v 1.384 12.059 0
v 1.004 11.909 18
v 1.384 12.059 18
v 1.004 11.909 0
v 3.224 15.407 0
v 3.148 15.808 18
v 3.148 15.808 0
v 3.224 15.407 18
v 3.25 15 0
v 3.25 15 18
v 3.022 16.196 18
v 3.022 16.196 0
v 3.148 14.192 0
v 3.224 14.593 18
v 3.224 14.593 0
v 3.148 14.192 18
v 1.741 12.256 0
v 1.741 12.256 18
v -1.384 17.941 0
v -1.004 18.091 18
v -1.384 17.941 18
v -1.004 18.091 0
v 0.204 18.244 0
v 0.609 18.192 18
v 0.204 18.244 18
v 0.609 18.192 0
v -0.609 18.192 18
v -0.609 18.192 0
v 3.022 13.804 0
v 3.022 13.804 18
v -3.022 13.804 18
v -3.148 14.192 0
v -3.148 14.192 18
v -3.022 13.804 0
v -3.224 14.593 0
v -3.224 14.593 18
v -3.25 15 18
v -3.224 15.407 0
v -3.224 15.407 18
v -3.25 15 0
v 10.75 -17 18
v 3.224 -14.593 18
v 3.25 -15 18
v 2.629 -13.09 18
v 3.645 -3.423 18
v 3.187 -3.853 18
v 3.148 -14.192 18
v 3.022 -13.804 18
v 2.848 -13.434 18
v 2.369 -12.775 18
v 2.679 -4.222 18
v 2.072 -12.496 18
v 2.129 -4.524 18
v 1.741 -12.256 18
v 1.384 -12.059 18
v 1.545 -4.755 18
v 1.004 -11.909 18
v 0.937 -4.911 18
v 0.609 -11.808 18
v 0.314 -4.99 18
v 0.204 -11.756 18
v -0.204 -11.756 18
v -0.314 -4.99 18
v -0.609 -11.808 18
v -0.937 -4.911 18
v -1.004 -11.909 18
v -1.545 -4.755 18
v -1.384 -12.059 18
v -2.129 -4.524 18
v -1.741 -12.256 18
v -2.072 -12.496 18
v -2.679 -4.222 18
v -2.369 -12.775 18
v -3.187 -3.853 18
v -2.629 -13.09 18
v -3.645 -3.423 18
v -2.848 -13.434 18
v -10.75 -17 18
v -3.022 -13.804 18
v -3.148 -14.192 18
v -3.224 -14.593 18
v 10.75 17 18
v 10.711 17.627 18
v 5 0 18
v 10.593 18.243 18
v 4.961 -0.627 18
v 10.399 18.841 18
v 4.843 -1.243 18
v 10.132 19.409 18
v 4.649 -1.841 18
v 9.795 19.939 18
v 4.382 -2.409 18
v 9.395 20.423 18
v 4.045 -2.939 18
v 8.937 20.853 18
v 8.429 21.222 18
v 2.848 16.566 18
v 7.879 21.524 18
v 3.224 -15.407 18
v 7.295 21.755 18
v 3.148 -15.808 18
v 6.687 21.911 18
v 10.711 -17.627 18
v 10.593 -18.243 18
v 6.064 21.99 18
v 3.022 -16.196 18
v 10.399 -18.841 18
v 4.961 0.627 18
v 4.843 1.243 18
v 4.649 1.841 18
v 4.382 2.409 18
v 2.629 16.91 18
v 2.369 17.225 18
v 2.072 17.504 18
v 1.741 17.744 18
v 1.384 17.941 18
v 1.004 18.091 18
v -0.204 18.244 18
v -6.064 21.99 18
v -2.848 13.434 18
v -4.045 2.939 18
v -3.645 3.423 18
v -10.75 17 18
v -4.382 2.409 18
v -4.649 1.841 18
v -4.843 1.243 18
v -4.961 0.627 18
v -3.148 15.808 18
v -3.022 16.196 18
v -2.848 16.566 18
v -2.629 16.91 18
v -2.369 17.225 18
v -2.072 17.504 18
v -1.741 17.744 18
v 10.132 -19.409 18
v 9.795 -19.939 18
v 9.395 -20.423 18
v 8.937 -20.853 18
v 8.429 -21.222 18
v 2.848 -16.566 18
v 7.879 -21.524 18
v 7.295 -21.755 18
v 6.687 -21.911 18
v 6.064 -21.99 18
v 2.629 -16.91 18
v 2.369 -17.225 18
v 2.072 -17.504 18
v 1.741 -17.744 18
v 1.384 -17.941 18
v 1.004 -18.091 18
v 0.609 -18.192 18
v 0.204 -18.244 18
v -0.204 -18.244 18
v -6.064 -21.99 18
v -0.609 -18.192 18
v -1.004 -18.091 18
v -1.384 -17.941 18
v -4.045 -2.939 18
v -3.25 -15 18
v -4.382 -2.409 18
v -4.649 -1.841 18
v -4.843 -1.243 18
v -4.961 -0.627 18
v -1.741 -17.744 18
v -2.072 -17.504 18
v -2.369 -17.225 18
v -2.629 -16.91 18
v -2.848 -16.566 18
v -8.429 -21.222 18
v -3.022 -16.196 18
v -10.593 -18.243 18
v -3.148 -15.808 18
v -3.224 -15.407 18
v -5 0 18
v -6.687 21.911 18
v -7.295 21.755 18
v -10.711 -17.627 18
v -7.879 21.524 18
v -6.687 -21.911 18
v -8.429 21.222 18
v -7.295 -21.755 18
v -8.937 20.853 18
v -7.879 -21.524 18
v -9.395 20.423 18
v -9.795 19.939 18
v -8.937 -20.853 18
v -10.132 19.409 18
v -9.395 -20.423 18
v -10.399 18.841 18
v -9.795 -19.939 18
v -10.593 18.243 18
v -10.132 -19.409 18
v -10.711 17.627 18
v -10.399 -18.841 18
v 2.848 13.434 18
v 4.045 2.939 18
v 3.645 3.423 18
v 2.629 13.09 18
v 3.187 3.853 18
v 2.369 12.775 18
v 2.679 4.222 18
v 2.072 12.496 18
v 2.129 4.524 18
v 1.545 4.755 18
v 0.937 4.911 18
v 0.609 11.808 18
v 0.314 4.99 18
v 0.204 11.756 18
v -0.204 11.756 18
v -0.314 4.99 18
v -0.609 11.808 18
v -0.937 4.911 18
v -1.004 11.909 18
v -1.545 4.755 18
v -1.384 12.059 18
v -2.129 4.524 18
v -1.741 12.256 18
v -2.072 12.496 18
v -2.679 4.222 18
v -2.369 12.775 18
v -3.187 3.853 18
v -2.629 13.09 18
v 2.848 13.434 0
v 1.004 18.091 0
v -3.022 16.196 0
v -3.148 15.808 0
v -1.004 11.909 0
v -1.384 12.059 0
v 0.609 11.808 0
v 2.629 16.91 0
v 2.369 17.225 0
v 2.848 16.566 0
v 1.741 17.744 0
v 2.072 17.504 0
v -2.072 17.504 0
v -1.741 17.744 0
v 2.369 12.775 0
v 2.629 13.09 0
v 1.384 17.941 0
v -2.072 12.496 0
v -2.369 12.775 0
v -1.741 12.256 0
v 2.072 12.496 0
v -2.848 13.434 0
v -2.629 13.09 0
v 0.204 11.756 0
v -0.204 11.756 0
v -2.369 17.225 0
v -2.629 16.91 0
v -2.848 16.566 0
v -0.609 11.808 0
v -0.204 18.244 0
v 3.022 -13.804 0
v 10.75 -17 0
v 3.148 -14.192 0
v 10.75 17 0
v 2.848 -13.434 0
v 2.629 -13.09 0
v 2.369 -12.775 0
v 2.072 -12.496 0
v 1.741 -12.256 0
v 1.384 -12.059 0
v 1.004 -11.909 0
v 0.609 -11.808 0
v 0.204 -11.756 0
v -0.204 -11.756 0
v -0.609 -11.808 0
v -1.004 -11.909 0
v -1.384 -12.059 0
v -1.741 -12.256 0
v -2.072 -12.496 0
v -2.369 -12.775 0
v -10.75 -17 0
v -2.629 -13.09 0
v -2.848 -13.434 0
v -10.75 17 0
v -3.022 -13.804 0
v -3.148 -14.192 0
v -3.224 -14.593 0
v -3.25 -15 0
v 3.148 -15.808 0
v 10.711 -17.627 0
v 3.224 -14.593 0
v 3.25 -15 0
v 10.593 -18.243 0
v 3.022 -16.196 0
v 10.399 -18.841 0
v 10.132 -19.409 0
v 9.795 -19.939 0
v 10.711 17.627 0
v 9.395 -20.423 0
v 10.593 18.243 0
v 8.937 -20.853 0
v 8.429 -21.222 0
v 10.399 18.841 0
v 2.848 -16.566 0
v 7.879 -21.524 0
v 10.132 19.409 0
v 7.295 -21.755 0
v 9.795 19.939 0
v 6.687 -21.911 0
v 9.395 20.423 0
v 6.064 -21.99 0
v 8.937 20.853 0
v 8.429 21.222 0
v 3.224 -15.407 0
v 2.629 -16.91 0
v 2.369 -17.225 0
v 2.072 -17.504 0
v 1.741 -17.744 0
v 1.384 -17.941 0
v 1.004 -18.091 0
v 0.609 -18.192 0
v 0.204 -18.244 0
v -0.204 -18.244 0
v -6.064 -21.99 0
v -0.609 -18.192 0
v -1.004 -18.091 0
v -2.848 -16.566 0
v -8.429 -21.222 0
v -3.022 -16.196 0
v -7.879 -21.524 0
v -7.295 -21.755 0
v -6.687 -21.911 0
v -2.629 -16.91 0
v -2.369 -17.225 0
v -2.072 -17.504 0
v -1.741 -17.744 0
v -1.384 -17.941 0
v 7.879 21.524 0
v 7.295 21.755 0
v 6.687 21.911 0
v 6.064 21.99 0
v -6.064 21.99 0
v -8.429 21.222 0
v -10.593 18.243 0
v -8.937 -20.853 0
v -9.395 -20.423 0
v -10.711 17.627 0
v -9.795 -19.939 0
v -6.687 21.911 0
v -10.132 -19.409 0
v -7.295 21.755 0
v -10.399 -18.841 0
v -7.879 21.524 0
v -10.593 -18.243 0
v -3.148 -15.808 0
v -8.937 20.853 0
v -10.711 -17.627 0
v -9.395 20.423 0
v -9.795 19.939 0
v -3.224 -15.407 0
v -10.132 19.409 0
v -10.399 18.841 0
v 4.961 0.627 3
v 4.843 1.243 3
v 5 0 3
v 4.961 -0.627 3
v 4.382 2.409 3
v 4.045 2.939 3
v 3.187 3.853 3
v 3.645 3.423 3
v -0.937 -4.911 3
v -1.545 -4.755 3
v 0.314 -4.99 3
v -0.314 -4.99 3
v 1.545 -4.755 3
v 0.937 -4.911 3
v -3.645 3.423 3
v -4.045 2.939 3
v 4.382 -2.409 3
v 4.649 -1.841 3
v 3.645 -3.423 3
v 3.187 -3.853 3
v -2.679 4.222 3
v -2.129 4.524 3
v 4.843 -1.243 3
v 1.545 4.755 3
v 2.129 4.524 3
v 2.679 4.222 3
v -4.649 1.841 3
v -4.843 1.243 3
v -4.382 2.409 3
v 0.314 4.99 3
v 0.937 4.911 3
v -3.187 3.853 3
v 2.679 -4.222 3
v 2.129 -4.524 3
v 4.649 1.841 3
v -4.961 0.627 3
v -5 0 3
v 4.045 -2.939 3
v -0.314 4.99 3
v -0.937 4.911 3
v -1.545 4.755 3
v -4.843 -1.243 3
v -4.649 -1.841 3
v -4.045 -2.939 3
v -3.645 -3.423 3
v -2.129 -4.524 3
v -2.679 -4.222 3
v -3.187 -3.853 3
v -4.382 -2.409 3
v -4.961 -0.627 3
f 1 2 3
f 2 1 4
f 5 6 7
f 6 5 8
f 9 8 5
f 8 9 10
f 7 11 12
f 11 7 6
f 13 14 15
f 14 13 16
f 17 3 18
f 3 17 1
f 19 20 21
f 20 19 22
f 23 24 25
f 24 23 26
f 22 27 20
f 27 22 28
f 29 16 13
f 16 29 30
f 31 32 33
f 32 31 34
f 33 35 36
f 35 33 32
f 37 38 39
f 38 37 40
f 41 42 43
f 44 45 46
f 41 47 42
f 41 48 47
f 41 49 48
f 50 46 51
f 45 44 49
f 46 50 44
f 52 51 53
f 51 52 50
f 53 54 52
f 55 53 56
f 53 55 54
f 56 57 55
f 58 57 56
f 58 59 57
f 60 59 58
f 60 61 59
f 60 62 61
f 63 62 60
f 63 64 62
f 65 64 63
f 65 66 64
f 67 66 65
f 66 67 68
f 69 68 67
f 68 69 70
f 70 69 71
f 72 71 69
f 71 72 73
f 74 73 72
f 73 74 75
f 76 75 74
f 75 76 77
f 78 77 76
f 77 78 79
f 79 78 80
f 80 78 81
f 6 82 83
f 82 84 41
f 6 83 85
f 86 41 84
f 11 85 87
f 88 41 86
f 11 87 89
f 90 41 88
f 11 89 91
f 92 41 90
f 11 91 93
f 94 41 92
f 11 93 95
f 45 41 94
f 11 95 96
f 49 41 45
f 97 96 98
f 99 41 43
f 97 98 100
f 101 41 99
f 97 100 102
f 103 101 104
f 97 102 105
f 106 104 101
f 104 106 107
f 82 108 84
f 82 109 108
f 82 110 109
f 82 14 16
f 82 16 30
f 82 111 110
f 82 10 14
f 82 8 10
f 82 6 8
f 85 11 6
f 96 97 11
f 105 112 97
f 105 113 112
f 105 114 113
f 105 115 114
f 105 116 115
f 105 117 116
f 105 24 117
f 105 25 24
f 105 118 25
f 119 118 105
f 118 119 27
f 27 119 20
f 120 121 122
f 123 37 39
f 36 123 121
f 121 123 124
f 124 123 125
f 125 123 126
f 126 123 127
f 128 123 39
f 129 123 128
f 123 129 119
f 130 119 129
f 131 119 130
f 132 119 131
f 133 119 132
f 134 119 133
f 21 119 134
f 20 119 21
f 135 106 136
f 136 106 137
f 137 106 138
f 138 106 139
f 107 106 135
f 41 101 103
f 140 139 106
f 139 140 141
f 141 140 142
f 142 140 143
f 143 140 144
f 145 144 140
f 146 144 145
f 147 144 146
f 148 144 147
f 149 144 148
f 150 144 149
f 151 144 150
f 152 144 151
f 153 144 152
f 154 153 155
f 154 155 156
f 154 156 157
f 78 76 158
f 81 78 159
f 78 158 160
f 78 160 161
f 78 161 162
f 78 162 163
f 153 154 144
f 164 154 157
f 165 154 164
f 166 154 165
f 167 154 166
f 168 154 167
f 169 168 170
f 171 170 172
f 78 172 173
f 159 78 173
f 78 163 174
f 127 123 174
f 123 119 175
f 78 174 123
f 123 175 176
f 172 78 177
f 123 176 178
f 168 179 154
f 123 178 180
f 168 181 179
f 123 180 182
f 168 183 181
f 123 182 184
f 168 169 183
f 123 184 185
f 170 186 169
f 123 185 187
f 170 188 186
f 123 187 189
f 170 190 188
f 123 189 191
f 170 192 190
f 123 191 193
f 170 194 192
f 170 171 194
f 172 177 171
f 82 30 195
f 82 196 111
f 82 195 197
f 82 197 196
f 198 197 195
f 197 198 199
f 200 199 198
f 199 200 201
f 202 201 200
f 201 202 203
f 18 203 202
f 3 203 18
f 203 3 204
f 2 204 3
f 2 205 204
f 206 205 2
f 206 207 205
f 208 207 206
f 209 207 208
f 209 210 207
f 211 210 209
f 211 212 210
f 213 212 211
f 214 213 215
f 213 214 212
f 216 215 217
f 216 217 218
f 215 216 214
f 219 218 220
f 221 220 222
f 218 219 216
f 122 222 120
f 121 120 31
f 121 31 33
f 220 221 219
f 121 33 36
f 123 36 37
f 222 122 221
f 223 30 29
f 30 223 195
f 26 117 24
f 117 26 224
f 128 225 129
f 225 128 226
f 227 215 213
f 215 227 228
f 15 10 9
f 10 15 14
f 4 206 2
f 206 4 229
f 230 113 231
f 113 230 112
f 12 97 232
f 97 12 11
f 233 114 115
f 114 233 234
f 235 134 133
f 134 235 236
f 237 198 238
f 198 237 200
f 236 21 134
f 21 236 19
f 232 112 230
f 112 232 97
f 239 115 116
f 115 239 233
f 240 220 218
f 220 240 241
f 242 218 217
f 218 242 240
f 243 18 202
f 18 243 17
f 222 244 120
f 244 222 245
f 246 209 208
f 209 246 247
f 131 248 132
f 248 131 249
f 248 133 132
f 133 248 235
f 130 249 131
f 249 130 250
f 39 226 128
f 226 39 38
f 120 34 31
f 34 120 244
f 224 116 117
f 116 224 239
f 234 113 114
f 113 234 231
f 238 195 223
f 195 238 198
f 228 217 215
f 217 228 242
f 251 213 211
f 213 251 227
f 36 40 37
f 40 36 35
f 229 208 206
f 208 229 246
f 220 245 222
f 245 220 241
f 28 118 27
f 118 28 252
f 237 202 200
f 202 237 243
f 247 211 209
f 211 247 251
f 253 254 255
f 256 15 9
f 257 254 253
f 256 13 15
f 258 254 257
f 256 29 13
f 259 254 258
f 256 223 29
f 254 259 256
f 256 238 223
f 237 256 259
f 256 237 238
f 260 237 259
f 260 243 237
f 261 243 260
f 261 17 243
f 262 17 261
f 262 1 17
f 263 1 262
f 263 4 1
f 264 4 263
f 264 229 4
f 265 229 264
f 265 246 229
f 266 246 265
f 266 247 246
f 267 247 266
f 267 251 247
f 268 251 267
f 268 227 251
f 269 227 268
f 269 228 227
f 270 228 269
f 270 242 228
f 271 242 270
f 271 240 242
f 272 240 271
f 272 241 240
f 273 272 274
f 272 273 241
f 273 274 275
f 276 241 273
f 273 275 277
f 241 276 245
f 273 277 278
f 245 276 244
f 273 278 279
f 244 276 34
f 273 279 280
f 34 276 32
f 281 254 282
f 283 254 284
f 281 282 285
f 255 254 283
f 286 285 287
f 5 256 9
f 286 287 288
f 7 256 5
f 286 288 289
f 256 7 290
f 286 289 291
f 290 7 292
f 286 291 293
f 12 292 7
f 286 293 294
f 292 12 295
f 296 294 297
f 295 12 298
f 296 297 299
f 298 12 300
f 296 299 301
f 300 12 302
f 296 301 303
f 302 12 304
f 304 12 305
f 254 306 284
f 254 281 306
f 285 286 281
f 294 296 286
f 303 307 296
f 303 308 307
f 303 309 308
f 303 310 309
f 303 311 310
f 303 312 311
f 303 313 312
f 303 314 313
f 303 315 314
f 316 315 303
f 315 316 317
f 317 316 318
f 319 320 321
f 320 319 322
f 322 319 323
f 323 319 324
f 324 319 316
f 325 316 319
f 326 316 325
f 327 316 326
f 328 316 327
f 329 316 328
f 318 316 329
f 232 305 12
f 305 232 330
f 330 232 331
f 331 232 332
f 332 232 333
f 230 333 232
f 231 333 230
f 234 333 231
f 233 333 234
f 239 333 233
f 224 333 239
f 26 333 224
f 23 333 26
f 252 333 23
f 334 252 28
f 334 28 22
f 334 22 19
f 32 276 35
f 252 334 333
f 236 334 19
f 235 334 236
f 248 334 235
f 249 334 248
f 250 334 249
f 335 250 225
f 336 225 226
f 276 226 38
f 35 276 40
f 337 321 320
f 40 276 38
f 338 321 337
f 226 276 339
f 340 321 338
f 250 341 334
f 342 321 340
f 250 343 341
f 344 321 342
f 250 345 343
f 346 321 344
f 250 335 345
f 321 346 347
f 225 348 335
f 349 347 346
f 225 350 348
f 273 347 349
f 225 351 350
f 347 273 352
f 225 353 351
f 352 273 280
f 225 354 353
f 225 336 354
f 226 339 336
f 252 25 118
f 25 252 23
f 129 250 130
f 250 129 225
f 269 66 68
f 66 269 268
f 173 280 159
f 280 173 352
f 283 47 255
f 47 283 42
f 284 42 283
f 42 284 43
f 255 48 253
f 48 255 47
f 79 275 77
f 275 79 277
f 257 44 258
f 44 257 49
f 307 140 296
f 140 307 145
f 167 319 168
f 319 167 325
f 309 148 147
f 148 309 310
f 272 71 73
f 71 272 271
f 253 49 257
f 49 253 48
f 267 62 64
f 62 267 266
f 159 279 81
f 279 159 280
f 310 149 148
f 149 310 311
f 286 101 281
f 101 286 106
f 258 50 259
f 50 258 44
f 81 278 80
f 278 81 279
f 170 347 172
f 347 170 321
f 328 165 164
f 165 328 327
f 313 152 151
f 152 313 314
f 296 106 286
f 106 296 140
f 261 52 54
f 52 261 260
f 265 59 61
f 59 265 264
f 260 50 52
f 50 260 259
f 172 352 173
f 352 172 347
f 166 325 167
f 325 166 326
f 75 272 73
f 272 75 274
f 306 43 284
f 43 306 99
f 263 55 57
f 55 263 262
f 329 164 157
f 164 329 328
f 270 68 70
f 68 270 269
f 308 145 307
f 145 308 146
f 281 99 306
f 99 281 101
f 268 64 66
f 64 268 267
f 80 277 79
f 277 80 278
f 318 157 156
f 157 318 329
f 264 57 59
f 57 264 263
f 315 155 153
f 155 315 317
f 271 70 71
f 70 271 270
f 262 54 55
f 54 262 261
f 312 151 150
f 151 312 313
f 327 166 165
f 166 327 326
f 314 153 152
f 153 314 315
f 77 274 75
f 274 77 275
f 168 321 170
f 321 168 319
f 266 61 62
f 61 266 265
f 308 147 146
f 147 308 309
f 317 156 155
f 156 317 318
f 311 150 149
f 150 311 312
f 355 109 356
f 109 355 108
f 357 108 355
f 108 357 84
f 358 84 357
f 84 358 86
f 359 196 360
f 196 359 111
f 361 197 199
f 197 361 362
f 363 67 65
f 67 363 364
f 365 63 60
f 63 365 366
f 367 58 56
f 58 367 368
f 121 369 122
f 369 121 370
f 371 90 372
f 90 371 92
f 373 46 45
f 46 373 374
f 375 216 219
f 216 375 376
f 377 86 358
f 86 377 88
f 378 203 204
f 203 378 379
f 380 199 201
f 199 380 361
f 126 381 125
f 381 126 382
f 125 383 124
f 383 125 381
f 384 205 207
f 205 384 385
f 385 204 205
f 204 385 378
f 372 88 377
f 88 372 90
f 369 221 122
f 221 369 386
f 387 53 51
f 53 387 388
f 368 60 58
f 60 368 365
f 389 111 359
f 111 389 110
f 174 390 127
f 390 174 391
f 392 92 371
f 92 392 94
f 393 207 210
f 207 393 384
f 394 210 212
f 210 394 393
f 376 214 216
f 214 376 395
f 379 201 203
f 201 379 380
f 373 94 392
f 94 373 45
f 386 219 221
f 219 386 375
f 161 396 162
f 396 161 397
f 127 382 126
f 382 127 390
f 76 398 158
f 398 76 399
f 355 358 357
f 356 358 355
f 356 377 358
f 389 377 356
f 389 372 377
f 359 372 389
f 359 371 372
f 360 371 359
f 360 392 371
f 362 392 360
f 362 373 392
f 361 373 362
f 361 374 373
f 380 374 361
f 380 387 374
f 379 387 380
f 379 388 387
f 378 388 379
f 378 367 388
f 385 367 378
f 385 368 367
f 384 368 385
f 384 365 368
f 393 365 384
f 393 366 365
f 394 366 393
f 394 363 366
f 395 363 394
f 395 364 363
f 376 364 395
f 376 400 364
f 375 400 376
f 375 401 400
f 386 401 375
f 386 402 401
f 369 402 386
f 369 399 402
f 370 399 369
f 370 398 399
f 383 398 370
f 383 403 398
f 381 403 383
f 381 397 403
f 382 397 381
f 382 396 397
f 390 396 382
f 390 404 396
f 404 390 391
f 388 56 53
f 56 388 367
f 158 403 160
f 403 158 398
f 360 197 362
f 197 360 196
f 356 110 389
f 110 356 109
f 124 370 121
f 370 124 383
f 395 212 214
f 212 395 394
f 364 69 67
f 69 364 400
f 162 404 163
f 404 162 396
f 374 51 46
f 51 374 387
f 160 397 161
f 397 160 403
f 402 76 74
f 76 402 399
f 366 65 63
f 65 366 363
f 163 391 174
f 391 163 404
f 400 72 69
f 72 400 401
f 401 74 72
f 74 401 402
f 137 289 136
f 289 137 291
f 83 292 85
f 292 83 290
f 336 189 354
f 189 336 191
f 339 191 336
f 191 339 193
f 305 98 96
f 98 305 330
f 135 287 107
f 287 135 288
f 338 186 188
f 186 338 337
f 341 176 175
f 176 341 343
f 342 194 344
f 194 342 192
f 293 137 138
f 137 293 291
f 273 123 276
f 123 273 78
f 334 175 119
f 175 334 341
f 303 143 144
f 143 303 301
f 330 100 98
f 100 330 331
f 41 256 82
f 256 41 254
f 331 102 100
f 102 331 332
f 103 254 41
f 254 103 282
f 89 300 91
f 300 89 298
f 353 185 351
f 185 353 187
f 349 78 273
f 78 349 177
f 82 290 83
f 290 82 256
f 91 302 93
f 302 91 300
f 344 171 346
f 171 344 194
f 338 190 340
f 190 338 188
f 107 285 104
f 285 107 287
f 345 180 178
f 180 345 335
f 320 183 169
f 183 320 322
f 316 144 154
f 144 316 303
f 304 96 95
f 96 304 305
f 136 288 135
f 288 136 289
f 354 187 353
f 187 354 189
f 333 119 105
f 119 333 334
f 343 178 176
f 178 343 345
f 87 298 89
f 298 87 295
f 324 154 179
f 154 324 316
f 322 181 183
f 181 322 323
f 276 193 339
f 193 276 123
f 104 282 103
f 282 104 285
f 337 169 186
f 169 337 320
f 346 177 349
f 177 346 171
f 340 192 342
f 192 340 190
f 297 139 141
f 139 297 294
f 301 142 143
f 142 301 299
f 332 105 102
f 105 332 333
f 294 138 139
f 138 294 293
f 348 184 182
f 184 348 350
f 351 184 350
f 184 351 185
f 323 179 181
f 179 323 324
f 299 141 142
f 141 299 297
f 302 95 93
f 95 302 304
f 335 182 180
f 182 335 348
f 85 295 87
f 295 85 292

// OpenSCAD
$fn = 50;


difference() {
	union() {
		hull() {
			translate(v = [-5.7500000000, 17.0000000000, 0]) {
				cylinder(h = 18, r = 5);
			}
			translate(v = [5.7500000000, 17.0000000000, 0]) {
				cylinder(h = 18, r = 5);
			}
			translate(v = [-5.7500000000, -17.0000000000, 0]) {
				cylinder(h = 18, r = 5);
			}
			translate(v = [5.7500000000, -17.0000000000, 0]) {
				cylinder(h = 18, r = 5);
			}
		}
	}
	union() {
		translate(v = [0.0000000000, 15.0000000000, 0]) {
			cylinder(h = 18, r = 3.2500000000);
		}
		translate(v = [0.0000000000, -15.0000000000, 0]) {
			cylinder(h = 18, r = 3.2500000000);
		}
		translate(v = [0.0000000000, 15.0000000000, 0]) {
			cylinder(h = 18, r = 1.8000000000);
		}
		translate(v = [0.0000000000, -15.0000000000, 0]) {
			cylinder(h = 18, r = 1.8000000000);
		}
		translate(v = [0.0000000000, 15.0000000000, 0]) {
			cylinder(h = 18, r = 1.8000000000);
		}
		translate(v = [0.0000000000, -15.0000000000, 0]) {
			cylinder(h = 18, r = 1.8000000000);
		}
		translate(v = [0.0000000000, 15.0000000000, 0]) {
			cylinder(h = 18, r = 1.8000000000);
		}
		translate(v = [0.0000000000, -15.0000000000, 0]) {
			cylinder(h = 18, r = 1.8000000000);
		}
		#translate(v = [0, 0, 3.0000000000]) {
			cylinder(h = 15, r = 5.0000000000);
		}
	}
}
